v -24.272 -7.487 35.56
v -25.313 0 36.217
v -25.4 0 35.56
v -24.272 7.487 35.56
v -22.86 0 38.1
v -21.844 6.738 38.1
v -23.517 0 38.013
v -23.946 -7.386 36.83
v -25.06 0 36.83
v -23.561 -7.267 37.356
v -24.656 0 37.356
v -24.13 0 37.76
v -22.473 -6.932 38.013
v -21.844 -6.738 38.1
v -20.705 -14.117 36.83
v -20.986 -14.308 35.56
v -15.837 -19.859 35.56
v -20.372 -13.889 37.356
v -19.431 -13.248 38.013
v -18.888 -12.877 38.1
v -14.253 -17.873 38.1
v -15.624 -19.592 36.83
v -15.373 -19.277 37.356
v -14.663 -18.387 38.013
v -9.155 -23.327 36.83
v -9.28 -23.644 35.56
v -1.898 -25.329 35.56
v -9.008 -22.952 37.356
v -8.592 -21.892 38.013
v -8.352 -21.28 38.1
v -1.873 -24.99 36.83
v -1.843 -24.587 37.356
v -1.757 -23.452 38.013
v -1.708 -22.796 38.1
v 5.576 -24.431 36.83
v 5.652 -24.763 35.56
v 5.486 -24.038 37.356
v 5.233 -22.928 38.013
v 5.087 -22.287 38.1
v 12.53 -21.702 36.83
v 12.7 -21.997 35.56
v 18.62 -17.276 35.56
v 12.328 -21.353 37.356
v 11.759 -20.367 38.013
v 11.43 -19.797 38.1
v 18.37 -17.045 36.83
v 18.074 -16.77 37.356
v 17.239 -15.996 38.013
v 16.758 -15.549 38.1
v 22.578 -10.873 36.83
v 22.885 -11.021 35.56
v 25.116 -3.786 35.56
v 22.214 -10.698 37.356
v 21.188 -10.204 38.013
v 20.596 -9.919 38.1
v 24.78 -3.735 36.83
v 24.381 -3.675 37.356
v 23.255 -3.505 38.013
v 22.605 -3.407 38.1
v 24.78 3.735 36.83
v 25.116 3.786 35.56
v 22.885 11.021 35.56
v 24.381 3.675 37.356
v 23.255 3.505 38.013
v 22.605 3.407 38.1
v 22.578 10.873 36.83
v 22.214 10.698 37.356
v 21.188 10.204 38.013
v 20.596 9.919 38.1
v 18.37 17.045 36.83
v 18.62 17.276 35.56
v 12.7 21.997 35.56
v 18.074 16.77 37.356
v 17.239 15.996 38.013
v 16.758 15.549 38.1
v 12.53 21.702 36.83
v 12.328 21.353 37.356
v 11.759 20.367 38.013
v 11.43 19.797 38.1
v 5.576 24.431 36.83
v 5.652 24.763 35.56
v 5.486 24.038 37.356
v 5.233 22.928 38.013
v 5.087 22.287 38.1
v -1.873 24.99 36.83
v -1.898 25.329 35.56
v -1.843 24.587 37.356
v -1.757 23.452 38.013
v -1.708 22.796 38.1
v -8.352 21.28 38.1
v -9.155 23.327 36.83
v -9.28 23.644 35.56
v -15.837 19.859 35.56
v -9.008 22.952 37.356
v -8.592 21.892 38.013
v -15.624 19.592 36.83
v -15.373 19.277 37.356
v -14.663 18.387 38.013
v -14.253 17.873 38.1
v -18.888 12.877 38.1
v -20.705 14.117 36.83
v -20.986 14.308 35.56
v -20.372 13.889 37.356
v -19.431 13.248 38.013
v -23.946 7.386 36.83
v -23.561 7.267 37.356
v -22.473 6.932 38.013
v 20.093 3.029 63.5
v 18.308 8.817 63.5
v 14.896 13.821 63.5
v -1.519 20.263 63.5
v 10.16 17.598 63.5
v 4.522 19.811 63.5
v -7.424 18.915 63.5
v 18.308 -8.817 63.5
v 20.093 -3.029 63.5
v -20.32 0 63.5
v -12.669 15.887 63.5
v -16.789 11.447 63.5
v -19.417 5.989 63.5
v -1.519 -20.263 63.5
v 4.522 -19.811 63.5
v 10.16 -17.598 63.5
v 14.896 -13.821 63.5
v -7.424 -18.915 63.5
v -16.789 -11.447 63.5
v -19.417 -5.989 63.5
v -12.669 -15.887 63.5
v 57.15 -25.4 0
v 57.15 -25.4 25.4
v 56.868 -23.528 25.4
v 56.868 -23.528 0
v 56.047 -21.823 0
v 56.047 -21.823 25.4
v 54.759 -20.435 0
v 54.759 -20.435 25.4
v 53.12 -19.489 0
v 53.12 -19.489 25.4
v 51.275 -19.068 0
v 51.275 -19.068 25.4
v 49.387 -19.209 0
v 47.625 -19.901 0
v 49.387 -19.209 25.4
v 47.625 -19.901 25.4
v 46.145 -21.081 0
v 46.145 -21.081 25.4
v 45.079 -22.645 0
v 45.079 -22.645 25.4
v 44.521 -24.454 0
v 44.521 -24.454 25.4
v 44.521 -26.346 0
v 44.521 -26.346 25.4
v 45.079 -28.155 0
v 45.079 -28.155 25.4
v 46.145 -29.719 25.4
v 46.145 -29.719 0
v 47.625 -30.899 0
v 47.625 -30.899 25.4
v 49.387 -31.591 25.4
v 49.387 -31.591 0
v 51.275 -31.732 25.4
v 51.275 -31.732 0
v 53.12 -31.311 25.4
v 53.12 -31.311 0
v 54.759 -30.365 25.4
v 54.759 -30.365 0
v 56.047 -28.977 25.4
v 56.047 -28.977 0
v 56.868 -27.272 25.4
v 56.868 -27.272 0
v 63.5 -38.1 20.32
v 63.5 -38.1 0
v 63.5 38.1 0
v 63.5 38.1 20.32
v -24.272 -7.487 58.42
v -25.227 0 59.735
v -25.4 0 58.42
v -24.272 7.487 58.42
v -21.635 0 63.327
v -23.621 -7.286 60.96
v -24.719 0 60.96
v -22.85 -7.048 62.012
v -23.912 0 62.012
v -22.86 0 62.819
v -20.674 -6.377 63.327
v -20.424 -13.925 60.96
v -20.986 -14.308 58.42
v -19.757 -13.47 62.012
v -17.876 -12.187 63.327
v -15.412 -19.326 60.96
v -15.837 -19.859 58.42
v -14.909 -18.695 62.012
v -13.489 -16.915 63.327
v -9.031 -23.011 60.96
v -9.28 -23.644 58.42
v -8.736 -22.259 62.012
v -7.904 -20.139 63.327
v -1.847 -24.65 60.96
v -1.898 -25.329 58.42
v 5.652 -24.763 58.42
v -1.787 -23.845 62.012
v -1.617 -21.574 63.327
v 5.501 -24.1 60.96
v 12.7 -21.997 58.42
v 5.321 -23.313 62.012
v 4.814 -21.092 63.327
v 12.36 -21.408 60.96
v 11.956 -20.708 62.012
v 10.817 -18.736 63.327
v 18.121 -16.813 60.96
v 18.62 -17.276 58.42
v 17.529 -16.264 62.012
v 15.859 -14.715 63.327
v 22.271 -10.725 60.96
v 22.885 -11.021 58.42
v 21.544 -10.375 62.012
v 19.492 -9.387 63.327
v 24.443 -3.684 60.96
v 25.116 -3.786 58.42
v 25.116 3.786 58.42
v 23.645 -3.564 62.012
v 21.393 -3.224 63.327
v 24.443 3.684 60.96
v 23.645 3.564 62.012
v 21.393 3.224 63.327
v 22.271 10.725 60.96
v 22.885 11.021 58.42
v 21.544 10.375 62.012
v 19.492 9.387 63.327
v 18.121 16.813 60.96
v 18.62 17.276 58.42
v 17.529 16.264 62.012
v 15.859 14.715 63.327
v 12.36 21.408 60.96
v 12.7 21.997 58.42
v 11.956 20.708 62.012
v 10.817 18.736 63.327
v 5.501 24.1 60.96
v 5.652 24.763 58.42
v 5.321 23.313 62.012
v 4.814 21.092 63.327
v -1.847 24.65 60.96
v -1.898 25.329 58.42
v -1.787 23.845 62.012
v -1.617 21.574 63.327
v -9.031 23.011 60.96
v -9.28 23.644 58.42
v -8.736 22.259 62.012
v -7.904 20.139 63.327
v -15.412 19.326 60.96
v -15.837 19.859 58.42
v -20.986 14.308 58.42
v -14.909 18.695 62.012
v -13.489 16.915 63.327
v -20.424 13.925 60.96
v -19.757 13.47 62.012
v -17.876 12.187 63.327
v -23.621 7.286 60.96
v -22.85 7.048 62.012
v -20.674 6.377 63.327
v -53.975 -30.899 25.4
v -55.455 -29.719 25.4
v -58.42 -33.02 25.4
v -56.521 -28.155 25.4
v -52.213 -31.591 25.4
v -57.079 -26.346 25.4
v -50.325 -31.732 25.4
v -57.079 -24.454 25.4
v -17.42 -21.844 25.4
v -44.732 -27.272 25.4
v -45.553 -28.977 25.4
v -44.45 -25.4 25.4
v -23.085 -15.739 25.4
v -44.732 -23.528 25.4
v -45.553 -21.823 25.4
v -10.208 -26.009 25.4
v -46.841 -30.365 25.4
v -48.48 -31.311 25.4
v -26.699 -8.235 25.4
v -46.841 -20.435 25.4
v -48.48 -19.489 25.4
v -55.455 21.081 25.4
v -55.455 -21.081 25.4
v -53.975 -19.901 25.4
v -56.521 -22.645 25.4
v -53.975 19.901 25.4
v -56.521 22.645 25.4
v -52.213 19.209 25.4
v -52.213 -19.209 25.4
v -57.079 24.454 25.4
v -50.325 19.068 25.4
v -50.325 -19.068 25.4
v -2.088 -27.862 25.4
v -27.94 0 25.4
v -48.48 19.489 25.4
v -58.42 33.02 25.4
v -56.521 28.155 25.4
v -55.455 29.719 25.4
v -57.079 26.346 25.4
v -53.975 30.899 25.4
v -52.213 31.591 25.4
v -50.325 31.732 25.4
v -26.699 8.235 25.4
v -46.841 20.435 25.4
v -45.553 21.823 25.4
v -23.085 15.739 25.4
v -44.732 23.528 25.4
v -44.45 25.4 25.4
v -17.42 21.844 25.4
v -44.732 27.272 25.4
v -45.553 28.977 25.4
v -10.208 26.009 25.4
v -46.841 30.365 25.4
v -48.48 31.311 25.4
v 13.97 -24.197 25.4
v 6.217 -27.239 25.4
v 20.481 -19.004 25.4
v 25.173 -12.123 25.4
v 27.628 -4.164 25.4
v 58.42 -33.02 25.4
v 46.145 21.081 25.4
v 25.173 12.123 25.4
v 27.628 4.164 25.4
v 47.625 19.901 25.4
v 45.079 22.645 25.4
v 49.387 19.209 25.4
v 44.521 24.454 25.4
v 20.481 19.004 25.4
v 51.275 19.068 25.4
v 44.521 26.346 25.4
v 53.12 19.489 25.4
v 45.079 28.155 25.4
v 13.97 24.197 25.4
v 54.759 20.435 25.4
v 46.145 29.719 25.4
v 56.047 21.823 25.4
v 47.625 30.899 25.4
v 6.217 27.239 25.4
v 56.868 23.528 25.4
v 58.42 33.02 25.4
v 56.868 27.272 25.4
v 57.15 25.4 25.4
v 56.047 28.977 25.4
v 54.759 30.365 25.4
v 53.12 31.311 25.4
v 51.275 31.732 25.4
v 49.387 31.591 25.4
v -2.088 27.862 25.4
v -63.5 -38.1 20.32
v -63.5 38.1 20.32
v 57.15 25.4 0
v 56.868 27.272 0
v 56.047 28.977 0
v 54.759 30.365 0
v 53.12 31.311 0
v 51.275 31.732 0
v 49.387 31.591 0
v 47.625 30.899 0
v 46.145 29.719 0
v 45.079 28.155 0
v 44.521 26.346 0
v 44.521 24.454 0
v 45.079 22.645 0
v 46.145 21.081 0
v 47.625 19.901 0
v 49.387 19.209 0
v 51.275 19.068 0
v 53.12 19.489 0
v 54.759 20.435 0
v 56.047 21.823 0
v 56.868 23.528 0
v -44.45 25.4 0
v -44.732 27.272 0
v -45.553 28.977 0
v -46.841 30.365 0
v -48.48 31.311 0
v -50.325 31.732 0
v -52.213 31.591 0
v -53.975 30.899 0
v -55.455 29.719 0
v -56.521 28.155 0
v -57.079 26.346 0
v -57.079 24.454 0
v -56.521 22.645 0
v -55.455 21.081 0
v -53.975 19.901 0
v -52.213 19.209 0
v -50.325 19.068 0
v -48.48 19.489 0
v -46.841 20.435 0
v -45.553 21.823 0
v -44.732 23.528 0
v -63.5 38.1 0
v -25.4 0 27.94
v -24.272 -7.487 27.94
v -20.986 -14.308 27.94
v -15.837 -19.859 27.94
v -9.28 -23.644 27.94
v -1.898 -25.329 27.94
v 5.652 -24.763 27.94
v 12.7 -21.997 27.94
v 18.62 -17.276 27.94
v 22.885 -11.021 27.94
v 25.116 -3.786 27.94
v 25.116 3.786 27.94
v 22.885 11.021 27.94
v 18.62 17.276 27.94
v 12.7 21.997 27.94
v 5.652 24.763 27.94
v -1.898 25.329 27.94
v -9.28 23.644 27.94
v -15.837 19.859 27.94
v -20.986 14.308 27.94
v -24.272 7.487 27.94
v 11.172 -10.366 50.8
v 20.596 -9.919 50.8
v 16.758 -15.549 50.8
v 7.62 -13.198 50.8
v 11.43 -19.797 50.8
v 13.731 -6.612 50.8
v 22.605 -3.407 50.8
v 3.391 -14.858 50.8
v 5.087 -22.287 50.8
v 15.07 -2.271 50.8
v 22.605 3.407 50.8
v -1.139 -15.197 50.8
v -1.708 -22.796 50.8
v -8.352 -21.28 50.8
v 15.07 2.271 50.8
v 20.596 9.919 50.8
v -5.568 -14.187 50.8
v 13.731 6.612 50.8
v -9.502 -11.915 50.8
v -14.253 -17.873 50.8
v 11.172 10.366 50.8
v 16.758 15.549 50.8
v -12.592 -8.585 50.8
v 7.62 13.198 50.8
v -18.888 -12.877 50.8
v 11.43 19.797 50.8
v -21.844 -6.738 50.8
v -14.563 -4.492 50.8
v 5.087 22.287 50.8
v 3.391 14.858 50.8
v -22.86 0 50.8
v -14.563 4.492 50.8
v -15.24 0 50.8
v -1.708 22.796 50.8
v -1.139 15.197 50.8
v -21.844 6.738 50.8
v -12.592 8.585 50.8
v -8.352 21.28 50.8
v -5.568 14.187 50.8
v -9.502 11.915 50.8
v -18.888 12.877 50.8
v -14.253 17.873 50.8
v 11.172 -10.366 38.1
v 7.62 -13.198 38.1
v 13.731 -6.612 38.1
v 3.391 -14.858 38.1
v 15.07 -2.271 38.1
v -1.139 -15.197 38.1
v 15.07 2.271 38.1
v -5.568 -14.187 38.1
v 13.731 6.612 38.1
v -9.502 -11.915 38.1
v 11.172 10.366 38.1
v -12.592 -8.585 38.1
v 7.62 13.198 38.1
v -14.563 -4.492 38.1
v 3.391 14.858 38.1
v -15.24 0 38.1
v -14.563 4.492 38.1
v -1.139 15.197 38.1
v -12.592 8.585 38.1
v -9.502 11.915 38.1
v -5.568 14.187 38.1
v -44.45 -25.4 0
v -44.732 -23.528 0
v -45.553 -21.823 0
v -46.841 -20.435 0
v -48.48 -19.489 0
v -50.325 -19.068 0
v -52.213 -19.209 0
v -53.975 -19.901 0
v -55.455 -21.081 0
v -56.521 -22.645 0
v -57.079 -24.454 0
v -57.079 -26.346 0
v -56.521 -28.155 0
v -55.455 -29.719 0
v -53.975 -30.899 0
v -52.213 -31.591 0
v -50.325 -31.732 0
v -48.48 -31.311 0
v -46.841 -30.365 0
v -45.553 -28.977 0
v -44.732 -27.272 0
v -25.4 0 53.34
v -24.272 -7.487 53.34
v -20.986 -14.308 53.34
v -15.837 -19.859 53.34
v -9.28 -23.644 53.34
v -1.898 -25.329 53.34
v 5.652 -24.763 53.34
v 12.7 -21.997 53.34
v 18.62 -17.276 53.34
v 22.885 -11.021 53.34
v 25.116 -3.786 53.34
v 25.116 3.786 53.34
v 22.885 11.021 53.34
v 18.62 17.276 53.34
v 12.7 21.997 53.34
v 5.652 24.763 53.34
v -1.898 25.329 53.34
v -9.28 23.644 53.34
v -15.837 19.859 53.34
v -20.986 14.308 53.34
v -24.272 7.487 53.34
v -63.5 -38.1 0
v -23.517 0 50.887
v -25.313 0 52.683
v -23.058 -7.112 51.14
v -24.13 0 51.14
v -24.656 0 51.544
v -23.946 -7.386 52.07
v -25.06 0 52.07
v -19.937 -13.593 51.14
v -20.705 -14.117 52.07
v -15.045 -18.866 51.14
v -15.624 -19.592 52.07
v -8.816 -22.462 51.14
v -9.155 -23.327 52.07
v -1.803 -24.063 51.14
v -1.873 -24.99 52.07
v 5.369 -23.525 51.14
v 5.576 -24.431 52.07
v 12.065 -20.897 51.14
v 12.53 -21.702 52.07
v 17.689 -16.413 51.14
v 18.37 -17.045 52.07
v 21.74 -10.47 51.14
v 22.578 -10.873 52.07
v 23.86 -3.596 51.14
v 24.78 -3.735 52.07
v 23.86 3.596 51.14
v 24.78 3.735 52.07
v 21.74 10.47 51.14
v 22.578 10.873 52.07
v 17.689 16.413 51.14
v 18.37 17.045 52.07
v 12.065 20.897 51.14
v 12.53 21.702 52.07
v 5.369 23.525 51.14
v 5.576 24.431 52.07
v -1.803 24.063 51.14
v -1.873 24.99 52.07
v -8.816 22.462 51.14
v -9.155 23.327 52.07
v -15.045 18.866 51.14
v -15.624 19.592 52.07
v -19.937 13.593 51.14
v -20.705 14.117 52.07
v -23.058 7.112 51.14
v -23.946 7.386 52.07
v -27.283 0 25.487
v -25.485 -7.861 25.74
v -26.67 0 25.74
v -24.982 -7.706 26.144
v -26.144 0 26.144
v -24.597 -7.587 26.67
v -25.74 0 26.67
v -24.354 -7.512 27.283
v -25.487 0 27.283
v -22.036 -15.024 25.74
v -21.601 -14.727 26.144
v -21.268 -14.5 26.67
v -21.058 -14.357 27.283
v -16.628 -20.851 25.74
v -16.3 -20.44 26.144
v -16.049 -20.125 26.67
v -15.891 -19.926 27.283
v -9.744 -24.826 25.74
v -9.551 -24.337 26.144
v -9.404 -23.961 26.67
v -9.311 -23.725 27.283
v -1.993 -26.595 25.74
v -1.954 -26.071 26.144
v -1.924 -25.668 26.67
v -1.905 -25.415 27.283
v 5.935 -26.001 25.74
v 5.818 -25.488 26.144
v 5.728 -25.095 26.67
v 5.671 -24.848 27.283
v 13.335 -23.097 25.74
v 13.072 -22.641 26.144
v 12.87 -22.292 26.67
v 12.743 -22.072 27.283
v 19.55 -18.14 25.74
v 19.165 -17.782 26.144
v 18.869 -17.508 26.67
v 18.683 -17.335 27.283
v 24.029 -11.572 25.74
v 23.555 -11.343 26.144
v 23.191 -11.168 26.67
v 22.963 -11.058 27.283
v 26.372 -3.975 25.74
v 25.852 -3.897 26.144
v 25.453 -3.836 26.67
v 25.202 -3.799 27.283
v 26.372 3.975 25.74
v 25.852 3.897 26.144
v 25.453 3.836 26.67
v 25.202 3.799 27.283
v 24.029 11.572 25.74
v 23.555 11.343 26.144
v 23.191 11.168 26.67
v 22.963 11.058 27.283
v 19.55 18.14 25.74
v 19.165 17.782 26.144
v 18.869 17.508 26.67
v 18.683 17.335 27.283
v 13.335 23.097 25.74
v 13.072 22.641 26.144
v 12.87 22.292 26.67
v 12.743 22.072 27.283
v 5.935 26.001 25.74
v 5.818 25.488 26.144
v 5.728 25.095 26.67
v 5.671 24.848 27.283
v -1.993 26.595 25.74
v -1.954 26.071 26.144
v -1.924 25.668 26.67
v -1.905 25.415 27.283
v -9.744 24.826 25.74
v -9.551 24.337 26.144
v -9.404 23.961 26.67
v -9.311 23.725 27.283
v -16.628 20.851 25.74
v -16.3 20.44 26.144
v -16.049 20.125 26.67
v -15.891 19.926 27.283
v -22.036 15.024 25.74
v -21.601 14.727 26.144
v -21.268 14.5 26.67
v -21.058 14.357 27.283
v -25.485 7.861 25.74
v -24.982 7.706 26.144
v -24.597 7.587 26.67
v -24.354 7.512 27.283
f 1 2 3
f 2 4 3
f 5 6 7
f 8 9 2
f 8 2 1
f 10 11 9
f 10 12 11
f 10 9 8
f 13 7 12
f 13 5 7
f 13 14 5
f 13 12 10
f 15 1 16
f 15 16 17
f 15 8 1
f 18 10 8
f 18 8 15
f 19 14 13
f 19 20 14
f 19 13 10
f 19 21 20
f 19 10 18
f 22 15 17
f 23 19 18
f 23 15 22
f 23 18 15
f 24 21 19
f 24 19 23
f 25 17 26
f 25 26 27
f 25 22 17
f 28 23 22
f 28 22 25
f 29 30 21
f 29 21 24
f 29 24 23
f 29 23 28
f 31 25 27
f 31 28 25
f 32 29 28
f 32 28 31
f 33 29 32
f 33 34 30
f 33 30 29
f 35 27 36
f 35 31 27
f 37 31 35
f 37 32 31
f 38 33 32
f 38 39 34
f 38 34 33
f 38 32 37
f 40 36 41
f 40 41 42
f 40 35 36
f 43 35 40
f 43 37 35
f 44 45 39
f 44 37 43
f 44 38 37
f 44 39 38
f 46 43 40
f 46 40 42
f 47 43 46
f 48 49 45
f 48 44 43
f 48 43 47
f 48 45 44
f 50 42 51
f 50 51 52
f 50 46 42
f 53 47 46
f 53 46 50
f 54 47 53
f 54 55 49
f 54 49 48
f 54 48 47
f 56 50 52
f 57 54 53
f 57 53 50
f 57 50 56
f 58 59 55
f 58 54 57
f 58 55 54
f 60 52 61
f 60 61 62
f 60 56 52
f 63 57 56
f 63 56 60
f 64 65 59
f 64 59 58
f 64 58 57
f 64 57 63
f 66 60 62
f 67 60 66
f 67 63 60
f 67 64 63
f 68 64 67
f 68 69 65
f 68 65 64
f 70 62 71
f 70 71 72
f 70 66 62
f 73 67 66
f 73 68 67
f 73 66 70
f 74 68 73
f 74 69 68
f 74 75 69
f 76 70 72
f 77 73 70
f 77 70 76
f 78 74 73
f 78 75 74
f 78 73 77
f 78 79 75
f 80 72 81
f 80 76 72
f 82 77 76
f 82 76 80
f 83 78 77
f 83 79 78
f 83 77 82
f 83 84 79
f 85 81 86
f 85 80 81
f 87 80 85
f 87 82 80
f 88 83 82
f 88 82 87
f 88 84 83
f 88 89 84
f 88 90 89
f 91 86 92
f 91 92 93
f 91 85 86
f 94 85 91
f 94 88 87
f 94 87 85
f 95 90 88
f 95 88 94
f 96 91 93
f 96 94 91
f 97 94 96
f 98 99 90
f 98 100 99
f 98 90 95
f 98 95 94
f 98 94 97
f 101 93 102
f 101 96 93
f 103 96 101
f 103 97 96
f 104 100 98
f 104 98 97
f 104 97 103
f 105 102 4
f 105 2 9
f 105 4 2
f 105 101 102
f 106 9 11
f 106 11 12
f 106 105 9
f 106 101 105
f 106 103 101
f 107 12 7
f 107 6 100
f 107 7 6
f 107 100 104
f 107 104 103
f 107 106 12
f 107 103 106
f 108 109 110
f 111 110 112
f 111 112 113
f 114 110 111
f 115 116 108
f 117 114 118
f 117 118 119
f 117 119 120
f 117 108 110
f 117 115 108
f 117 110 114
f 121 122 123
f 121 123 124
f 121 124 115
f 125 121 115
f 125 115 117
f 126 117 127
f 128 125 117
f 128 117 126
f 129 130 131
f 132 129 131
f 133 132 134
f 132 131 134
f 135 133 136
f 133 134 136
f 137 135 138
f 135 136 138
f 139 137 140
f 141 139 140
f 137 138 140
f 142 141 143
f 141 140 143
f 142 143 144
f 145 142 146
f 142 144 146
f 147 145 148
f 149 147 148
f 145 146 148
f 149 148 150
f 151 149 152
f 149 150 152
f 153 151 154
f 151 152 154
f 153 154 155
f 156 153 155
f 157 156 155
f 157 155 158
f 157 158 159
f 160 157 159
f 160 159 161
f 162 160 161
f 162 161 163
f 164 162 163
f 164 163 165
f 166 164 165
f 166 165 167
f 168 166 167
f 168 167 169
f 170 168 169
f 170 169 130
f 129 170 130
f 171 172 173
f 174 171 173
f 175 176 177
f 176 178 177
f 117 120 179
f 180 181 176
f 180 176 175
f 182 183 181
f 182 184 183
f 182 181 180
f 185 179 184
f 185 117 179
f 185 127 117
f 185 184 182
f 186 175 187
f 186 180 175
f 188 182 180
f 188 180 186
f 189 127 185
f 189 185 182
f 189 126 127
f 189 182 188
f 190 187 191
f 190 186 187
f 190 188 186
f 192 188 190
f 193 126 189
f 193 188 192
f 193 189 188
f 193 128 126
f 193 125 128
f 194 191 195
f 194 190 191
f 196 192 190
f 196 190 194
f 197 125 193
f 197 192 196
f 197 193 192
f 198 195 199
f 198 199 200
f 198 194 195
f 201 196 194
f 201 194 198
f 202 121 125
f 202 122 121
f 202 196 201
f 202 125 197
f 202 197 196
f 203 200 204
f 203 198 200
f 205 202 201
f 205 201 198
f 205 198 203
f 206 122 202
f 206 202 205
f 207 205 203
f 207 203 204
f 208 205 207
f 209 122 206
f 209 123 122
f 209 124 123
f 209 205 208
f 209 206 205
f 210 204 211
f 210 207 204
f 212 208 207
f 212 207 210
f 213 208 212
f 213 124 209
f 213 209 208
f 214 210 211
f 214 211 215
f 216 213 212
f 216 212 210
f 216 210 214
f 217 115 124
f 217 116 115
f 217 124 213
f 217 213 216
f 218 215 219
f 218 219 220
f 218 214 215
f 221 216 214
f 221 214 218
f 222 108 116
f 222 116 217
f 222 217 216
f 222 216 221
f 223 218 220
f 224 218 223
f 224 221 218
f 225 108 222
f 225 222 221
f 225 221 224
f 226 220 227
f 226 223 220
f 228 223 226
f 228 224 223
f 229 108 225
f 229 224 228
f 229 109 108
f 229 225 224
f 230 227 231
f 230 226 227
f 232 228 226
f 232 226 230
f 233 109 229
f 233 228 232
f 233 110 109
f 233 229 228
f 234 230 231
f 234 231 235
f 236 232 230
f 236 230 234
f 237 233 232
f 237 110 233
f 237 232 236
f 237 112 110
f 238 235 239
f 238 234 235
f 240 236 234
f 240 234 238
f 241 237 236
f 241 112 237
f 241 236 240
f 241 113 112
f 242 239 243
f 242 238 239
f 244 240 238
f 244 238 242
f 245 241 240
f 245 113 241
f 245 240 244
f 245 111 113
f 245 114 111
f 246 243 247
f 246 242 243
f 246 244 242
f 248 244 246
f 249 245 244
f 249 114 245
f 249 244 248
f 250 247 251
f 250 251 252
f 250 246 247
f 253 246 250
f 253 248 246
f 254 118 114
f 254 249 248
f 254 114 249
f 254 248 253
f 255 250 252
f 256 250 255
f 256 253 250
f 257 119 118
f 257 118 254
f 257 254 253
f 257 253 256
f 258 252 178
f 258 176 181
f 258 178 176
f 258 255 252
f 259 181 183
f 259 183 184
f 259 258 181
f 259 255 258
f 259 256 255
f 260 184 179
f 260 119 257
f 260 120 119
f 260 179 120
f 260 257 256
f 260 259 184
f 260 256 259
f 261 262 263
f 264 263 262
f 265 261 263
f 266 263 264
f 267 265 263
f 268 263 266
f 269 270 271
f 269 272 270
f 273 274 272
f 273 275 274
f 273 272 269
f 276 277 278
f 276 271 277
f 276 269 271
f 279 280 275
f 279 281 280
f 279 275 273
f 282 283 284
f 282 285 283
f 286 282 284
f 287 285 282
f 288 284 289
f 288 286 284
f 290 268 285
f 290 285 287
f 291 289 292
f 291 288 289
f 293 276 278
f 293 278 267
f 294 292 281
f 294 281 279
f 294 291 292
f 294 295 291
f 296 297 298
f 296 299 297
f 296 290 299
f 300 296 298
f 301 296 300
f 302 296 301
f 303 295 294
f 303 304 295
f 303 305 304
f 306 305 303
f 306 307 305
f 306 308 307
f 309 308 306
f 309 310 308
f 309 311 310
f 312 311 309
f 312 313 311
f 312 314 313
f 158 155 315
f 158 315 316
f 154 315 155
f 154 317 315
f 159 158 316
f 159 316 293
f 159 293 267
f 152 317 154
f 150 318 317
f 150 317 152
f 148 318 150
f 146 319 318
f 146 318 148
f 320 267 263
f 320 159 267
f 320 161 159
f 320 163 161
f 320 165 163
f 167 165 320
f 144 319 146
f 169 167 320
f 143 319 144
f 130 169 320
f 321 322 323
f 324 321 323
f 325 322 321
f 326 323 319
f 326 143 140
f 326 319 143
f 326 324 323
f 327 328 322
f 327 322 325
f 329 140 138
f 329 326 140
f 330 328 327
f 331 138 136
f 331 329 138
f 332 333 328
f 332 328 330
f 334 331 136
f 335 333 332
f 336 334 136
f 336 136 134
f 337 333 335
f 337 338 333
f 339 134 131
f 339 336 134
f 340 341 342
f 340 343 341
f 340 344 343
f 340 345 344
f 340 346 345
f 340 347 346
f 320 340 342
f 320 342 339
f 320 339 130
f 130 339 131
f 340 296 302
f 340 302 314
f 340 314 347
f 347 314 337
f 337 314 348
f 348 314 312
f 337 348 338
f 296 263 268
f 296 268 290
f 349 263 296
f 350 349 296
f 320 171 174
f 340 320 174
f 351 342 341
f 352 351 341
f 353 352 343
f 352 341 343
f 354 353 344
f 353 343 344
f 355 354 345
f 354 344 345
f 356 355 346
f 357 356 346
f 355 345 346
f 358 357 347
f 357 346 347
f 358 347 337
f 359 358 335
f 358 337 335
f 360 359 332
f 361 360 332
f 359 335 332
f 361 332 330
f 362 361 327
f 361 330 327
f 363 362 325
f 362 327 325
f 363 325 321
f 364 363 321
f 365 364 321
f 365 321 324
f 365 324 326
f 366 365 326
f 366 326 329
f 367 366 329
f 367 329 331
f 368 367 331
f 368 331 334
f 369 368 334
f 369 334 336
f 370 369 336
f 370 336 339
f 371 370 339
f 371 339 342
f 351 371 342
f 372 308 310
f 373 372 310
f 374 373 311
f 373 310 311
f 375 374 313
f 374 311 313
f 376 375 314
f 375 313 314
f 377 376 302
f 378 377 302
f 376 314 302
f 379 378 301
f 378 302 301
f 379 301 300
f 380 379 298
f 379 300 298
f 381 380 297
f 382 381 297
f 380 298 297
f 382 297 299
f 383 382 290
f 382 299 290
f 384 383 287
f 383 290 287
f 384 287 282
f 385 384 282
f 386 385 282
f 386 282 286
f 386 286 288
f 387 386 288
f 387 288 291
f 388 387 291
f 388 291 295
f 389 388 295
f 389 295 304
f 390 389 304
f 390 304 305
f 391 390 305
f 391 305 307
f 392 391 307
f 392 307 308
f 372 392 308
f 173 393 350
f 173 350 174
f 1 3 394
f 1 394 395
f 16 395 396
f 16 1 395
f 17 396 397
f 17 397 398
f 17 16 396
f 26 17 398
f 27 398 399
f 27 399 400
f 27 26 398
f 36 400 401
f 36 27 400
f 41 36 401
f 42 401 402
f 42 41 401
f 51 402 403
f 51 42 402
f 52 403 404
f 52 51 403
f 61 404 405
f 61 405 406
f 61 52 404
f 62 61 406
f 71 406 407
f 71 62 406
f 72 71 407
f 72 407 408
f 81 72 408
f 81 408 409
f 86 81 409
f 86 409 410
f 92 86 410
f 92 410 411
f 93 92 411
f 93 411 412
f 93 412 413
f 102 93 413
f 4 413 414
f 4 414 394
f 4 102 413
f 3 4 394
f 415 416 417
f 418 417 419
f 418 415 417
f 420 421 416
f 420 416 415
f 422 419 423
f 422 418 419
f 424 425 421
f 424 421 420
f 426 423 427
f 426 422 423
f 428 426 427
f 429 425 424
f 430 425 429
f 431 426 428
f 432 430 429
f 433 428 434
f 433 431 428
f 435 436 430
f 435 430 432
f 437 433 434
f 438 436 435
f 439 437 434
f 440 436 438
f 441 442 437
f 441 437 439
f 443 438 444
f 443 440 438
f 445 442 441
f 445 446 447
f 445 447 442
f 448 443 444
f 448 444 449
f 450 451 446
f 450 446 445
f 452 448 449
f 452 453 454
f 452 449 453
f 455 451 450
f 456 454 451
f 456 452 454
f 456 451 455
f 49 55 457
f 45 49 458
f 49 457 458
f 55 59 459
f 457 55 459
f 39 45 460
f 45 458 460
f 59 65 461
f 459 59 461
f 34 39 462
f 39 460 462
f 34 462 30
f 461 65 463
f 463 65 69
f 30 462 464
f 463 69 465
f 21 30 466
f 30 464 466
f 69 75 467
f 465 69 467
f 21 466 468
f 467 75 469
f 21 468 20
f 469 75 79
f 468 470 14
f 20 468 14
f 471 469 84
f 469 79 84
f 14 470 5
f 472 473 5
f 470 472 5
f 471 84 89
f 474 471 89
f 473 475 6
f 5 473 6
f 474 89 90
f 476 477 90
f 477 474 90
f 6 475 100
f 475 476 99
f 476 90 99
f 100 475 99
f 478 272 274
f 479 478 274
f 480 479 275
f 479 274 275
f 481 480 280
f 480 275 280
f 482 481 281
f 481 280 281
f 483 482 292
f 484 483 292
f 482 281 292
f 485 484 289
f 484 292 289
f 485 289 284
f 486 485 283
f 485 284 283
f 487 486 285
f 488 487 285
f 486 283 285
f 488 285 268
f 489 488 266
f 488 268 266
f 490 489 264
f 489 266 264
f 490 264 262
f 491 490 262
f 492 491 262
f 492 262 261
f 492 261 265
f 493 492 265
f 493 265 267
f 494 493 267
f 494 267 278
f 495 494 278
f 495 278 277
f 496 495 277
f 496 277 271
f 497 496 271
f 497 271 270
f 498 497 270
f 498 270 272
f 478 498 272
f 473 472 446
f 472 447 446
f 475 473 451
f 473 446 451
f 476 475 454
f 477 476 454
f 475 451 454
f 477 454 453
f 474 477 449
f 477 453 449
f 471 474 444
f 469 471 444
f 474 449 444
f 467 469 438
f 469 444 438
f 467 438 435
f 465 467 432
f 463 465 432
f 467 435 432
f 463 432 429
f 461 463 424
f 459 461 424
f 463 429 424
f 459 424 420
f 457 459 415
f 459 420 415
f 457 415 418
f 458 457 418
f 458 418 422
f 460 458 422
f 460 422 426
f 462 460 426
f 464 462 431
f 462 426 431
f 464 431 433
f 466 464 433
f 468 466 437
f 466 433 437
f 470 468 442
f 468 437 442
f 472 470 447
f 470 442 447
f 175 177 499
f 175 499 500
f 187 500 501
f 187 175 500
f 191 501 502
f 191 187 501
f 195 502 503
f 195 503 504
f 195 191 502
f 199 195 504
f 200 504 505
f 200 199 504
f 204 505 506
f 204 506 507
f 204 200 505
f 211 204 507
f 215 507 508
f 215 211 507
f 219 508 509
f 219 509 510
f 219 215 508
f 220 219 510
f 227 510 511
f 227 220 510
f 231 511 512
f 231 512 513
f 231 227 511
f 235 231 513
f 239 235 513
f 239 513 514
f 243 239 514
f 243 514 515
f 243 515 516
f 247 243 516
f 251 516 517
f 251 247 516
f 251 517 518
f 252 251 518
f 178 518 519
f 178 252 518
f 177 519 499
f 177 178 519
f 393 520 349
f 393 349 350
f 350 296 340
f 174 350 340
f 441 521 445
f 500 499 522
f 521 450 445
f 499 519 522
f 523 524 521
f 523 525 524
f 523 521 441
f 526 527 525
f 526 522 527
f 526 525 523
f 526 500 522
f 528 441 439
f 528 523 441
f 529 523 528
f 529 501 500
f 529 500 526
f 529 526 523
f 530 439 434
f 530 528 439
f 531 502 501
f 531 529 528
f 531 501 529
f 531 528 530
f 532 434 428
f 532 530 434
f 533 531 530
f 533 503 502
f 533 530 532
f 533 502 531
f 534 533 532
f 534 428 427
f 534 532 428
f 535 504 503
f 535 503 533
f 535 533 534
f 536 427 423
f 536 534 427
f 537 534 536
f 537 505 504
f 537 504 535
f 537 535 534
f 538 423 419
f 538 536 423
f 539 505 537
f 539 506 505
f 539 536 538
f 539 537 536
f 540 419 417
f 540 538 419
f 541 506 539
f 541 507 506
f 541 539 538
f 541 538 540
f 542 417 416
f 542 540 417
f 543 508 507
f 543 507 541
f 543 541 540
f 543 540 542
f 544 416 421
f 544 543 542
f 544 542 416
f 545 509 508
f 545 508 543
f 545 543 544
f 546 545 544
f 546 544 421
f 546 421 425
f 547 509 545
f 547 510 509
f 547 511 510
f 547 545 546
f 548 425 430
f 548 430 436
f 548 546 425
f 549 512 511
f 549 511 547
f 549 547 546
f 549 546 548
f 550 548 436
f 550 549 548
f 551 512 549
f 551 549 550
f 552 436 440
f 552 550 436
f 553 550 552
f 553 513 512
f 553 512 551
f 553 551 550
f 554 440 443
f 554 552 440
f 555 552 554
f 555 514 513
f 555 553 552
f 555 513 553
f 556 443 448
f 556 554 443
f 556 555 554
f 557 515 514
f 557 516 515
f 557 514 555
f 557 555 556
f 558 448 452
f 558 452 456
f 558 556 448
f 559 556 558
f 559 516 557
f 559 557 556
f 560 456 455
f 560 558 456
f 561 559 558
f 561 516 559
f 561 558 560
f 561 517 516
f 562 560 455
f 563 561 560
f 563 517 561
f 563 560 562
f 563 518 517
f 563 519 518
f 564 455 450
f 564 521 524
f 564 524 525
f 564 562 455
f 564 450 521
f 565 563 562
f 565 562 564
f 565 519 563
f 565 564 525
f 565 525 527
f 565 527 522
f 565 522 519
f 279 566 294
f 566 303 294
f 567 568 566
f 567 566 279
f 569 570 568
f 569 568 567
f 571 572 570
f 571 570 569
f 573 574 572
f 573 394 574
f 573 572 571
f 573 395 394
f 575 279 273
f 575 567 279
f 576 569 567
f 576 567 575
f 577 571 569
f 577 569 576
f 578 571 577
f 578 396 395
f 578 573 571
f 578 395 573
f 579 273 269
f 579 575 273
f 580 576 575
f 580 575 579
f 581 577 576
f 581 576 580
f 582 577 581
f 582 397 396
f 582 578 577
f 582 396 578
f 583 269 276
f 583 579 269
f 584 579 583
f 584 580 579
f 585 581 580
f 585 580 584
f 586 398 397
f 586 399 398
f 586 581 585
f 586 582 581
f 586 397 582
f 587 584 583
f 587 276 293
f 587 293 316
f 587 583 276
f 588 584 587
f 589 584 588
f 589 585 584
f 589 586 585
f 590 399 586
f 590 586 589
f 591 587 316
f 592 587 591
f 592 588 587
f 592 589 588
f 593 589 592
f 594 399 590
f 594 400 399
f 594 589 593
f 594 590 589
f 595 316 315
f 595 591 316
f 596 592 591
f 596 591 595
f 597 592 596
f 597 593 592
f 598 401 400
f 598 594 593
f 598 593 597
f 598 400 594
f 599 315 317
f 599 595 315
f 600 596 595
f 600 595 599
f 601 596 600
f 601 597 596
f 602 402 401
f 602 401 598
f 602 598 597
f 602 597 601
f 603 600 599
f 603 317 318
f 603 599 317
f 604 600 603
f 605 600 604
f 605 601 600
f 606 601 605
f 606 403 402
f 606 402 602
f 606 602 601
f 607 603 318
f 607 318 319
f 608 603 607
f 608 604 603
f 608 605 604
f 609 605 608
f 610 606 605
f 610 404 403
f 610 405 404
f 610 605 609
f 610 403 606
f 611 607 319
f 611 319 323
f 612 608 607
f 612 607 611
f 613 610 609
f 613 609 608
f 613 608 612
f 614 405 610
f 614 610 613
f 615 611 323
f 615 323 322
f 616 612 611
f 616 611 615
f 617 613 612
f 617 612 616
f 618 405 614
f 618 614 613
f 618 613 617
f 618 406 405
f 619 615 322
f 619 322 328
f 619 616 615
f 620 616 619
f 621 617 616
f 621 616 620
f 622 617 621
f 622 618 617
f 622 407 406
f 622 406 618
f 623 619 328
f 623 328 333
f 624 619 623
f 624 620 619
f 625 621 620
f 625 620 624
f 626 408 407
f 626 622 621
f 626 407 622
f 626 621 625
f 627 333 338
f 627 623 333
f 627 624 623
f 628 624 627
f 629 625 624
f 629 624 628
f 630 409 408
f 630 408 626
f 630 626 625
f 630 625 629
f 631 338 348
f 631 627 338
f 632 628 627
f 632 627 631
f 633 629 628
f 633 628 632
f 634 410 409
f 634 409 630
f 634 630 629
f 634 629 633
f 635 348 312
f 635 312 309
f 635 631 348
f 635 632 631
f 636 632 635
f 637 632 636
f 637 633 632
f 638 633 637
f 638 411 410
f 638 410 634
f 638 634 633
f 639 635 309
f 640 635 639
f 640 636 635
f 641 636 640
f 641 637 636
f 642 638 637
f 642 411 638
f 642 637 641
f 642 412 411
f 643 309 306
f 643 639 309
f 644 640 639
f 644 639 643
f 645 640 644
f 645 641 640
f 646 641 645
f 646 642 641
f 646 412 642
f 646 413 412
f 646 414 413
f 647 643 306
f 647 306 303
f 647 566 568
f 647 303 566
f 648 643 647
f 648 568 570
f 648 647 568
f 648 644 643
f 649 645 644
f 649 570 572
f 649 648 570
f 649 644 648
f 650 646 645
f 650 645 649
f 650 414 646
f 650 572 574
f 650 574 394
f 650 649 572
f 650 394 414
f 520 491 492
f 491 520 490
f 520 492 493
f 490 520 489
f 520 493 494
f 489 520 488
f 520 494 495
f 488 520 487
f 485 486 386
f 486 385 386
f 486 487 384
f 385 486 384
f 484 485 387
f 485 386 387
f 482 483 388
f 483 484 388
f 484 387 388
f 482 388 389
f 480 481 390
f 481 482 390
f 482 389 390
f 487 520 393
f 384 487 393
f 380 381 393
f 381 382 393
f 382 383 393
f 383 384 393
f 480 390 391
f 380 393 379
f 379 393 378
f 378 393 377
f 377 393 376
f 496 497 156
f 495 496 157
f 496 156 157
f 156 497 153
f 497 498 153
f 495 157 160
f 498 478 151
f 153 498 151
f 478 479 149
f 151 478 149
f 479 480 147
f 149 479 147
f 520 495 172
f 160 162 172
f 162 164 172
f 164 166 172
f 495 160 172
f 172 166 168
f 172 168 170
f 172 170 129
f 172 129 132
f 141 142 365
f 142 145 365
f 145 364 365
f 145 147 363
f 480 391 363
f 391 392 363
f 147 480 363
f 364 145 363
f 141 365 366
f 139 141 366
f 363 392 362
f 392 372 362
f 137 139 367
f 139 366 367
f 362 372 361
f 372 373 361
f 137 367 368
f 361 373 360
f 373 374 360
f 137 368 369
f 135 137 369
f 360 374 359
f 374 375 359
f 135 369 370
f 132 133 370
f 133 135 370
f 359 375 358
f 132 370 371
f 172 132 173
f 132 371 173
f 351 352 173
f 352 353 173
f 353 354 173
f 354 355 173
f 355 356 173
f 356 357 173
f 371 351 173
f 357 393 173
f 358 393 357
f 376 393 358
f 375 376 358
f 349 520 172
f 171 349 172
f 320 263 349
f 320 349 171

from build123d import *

# Parameters (mm, degrees)
F0_W     = 127
F0_H     = 76.2
F1_DEPTH = 25.4
F2_R     = 6.35
F3_DEPTH = 25.401
F4_W     = 25.4
F4_H     = 38.1
F6_W     = 25.4
F6_H     = 12.7
F8_SIZE  = 5.08
F9_R     = 2.54
F10_R    = 5.08


with BuildPart() as f1:
    # F0 (on Top) → F1 (new body)
    with BuildSketch(Plane.XY):
        Rectangle(F0_W, F0_H)
    extrude(amount=F1_DEPTH)

    # F2 (on face) → F3 (cut, through all)
    with BuildSketch(Plane.XY.offset(25.4)):
        with Locations((50.8, 25.4)):
            Circle(F2_R)
        with Locations((50.8, -25.4)):
            Circle(F2_R)
        with Locations((-50.8, -25.4)):
            Circle(F2_R)
        with Locations((-50.8, 25.4)):
            Circle(F2_R)
    extrude(amount=-F3_DEPTH, mode=Mode.SUBTRACT)

    # F4 (on Front) → F5 (revolve)
    with BuildSketch(Plane.XZ):
        with Locations((-12.7, 44.45)):
            Rectangle(F4_W, F4_H)
    revolve(axis=Axis((0, 0, 44.45), (0, 0, 1)))

    # F6 (on Front) → F7 (revolve, cut)
    with BuildSketch(Plane.XZ):
        with Locations((-27.94, 44.45)):
            Rectangle(F6_W, F6_H)
    revolve(axis=Axis((0, 0, 63.5), (0, 0, -1)), mode=Mode.SUBTRACT)

    # F8
    f8_edges = [f1.edges().sort_by_distance(p)[0] for p in [
        (63.5, 0, 25.4),
        (0, 38.1, 25.4),
        (-63.5, 0, 25.4),
        (0, -38.1, 25.4),
    ]]
    chamfer(f8_edges, length=F8_SIZE)

    # F9
    f9_edges = [f1.edges().sort_by_distance(p)[0] for p in [
        (25.4, 0, 38.1),
        (25.4, 0, 25.4),
        (25.4, 0, 50.8),
    ]]
    fillet(f9_edges, radius=F9_R)

    # F10
    f10_edges = [f1.edges().sort_by_distance(p)[0] for p in [
        (25.4, 0, 63.5),
    ]]
    fillet(f10_edges, radius=F10_R)


solid = f1.part
